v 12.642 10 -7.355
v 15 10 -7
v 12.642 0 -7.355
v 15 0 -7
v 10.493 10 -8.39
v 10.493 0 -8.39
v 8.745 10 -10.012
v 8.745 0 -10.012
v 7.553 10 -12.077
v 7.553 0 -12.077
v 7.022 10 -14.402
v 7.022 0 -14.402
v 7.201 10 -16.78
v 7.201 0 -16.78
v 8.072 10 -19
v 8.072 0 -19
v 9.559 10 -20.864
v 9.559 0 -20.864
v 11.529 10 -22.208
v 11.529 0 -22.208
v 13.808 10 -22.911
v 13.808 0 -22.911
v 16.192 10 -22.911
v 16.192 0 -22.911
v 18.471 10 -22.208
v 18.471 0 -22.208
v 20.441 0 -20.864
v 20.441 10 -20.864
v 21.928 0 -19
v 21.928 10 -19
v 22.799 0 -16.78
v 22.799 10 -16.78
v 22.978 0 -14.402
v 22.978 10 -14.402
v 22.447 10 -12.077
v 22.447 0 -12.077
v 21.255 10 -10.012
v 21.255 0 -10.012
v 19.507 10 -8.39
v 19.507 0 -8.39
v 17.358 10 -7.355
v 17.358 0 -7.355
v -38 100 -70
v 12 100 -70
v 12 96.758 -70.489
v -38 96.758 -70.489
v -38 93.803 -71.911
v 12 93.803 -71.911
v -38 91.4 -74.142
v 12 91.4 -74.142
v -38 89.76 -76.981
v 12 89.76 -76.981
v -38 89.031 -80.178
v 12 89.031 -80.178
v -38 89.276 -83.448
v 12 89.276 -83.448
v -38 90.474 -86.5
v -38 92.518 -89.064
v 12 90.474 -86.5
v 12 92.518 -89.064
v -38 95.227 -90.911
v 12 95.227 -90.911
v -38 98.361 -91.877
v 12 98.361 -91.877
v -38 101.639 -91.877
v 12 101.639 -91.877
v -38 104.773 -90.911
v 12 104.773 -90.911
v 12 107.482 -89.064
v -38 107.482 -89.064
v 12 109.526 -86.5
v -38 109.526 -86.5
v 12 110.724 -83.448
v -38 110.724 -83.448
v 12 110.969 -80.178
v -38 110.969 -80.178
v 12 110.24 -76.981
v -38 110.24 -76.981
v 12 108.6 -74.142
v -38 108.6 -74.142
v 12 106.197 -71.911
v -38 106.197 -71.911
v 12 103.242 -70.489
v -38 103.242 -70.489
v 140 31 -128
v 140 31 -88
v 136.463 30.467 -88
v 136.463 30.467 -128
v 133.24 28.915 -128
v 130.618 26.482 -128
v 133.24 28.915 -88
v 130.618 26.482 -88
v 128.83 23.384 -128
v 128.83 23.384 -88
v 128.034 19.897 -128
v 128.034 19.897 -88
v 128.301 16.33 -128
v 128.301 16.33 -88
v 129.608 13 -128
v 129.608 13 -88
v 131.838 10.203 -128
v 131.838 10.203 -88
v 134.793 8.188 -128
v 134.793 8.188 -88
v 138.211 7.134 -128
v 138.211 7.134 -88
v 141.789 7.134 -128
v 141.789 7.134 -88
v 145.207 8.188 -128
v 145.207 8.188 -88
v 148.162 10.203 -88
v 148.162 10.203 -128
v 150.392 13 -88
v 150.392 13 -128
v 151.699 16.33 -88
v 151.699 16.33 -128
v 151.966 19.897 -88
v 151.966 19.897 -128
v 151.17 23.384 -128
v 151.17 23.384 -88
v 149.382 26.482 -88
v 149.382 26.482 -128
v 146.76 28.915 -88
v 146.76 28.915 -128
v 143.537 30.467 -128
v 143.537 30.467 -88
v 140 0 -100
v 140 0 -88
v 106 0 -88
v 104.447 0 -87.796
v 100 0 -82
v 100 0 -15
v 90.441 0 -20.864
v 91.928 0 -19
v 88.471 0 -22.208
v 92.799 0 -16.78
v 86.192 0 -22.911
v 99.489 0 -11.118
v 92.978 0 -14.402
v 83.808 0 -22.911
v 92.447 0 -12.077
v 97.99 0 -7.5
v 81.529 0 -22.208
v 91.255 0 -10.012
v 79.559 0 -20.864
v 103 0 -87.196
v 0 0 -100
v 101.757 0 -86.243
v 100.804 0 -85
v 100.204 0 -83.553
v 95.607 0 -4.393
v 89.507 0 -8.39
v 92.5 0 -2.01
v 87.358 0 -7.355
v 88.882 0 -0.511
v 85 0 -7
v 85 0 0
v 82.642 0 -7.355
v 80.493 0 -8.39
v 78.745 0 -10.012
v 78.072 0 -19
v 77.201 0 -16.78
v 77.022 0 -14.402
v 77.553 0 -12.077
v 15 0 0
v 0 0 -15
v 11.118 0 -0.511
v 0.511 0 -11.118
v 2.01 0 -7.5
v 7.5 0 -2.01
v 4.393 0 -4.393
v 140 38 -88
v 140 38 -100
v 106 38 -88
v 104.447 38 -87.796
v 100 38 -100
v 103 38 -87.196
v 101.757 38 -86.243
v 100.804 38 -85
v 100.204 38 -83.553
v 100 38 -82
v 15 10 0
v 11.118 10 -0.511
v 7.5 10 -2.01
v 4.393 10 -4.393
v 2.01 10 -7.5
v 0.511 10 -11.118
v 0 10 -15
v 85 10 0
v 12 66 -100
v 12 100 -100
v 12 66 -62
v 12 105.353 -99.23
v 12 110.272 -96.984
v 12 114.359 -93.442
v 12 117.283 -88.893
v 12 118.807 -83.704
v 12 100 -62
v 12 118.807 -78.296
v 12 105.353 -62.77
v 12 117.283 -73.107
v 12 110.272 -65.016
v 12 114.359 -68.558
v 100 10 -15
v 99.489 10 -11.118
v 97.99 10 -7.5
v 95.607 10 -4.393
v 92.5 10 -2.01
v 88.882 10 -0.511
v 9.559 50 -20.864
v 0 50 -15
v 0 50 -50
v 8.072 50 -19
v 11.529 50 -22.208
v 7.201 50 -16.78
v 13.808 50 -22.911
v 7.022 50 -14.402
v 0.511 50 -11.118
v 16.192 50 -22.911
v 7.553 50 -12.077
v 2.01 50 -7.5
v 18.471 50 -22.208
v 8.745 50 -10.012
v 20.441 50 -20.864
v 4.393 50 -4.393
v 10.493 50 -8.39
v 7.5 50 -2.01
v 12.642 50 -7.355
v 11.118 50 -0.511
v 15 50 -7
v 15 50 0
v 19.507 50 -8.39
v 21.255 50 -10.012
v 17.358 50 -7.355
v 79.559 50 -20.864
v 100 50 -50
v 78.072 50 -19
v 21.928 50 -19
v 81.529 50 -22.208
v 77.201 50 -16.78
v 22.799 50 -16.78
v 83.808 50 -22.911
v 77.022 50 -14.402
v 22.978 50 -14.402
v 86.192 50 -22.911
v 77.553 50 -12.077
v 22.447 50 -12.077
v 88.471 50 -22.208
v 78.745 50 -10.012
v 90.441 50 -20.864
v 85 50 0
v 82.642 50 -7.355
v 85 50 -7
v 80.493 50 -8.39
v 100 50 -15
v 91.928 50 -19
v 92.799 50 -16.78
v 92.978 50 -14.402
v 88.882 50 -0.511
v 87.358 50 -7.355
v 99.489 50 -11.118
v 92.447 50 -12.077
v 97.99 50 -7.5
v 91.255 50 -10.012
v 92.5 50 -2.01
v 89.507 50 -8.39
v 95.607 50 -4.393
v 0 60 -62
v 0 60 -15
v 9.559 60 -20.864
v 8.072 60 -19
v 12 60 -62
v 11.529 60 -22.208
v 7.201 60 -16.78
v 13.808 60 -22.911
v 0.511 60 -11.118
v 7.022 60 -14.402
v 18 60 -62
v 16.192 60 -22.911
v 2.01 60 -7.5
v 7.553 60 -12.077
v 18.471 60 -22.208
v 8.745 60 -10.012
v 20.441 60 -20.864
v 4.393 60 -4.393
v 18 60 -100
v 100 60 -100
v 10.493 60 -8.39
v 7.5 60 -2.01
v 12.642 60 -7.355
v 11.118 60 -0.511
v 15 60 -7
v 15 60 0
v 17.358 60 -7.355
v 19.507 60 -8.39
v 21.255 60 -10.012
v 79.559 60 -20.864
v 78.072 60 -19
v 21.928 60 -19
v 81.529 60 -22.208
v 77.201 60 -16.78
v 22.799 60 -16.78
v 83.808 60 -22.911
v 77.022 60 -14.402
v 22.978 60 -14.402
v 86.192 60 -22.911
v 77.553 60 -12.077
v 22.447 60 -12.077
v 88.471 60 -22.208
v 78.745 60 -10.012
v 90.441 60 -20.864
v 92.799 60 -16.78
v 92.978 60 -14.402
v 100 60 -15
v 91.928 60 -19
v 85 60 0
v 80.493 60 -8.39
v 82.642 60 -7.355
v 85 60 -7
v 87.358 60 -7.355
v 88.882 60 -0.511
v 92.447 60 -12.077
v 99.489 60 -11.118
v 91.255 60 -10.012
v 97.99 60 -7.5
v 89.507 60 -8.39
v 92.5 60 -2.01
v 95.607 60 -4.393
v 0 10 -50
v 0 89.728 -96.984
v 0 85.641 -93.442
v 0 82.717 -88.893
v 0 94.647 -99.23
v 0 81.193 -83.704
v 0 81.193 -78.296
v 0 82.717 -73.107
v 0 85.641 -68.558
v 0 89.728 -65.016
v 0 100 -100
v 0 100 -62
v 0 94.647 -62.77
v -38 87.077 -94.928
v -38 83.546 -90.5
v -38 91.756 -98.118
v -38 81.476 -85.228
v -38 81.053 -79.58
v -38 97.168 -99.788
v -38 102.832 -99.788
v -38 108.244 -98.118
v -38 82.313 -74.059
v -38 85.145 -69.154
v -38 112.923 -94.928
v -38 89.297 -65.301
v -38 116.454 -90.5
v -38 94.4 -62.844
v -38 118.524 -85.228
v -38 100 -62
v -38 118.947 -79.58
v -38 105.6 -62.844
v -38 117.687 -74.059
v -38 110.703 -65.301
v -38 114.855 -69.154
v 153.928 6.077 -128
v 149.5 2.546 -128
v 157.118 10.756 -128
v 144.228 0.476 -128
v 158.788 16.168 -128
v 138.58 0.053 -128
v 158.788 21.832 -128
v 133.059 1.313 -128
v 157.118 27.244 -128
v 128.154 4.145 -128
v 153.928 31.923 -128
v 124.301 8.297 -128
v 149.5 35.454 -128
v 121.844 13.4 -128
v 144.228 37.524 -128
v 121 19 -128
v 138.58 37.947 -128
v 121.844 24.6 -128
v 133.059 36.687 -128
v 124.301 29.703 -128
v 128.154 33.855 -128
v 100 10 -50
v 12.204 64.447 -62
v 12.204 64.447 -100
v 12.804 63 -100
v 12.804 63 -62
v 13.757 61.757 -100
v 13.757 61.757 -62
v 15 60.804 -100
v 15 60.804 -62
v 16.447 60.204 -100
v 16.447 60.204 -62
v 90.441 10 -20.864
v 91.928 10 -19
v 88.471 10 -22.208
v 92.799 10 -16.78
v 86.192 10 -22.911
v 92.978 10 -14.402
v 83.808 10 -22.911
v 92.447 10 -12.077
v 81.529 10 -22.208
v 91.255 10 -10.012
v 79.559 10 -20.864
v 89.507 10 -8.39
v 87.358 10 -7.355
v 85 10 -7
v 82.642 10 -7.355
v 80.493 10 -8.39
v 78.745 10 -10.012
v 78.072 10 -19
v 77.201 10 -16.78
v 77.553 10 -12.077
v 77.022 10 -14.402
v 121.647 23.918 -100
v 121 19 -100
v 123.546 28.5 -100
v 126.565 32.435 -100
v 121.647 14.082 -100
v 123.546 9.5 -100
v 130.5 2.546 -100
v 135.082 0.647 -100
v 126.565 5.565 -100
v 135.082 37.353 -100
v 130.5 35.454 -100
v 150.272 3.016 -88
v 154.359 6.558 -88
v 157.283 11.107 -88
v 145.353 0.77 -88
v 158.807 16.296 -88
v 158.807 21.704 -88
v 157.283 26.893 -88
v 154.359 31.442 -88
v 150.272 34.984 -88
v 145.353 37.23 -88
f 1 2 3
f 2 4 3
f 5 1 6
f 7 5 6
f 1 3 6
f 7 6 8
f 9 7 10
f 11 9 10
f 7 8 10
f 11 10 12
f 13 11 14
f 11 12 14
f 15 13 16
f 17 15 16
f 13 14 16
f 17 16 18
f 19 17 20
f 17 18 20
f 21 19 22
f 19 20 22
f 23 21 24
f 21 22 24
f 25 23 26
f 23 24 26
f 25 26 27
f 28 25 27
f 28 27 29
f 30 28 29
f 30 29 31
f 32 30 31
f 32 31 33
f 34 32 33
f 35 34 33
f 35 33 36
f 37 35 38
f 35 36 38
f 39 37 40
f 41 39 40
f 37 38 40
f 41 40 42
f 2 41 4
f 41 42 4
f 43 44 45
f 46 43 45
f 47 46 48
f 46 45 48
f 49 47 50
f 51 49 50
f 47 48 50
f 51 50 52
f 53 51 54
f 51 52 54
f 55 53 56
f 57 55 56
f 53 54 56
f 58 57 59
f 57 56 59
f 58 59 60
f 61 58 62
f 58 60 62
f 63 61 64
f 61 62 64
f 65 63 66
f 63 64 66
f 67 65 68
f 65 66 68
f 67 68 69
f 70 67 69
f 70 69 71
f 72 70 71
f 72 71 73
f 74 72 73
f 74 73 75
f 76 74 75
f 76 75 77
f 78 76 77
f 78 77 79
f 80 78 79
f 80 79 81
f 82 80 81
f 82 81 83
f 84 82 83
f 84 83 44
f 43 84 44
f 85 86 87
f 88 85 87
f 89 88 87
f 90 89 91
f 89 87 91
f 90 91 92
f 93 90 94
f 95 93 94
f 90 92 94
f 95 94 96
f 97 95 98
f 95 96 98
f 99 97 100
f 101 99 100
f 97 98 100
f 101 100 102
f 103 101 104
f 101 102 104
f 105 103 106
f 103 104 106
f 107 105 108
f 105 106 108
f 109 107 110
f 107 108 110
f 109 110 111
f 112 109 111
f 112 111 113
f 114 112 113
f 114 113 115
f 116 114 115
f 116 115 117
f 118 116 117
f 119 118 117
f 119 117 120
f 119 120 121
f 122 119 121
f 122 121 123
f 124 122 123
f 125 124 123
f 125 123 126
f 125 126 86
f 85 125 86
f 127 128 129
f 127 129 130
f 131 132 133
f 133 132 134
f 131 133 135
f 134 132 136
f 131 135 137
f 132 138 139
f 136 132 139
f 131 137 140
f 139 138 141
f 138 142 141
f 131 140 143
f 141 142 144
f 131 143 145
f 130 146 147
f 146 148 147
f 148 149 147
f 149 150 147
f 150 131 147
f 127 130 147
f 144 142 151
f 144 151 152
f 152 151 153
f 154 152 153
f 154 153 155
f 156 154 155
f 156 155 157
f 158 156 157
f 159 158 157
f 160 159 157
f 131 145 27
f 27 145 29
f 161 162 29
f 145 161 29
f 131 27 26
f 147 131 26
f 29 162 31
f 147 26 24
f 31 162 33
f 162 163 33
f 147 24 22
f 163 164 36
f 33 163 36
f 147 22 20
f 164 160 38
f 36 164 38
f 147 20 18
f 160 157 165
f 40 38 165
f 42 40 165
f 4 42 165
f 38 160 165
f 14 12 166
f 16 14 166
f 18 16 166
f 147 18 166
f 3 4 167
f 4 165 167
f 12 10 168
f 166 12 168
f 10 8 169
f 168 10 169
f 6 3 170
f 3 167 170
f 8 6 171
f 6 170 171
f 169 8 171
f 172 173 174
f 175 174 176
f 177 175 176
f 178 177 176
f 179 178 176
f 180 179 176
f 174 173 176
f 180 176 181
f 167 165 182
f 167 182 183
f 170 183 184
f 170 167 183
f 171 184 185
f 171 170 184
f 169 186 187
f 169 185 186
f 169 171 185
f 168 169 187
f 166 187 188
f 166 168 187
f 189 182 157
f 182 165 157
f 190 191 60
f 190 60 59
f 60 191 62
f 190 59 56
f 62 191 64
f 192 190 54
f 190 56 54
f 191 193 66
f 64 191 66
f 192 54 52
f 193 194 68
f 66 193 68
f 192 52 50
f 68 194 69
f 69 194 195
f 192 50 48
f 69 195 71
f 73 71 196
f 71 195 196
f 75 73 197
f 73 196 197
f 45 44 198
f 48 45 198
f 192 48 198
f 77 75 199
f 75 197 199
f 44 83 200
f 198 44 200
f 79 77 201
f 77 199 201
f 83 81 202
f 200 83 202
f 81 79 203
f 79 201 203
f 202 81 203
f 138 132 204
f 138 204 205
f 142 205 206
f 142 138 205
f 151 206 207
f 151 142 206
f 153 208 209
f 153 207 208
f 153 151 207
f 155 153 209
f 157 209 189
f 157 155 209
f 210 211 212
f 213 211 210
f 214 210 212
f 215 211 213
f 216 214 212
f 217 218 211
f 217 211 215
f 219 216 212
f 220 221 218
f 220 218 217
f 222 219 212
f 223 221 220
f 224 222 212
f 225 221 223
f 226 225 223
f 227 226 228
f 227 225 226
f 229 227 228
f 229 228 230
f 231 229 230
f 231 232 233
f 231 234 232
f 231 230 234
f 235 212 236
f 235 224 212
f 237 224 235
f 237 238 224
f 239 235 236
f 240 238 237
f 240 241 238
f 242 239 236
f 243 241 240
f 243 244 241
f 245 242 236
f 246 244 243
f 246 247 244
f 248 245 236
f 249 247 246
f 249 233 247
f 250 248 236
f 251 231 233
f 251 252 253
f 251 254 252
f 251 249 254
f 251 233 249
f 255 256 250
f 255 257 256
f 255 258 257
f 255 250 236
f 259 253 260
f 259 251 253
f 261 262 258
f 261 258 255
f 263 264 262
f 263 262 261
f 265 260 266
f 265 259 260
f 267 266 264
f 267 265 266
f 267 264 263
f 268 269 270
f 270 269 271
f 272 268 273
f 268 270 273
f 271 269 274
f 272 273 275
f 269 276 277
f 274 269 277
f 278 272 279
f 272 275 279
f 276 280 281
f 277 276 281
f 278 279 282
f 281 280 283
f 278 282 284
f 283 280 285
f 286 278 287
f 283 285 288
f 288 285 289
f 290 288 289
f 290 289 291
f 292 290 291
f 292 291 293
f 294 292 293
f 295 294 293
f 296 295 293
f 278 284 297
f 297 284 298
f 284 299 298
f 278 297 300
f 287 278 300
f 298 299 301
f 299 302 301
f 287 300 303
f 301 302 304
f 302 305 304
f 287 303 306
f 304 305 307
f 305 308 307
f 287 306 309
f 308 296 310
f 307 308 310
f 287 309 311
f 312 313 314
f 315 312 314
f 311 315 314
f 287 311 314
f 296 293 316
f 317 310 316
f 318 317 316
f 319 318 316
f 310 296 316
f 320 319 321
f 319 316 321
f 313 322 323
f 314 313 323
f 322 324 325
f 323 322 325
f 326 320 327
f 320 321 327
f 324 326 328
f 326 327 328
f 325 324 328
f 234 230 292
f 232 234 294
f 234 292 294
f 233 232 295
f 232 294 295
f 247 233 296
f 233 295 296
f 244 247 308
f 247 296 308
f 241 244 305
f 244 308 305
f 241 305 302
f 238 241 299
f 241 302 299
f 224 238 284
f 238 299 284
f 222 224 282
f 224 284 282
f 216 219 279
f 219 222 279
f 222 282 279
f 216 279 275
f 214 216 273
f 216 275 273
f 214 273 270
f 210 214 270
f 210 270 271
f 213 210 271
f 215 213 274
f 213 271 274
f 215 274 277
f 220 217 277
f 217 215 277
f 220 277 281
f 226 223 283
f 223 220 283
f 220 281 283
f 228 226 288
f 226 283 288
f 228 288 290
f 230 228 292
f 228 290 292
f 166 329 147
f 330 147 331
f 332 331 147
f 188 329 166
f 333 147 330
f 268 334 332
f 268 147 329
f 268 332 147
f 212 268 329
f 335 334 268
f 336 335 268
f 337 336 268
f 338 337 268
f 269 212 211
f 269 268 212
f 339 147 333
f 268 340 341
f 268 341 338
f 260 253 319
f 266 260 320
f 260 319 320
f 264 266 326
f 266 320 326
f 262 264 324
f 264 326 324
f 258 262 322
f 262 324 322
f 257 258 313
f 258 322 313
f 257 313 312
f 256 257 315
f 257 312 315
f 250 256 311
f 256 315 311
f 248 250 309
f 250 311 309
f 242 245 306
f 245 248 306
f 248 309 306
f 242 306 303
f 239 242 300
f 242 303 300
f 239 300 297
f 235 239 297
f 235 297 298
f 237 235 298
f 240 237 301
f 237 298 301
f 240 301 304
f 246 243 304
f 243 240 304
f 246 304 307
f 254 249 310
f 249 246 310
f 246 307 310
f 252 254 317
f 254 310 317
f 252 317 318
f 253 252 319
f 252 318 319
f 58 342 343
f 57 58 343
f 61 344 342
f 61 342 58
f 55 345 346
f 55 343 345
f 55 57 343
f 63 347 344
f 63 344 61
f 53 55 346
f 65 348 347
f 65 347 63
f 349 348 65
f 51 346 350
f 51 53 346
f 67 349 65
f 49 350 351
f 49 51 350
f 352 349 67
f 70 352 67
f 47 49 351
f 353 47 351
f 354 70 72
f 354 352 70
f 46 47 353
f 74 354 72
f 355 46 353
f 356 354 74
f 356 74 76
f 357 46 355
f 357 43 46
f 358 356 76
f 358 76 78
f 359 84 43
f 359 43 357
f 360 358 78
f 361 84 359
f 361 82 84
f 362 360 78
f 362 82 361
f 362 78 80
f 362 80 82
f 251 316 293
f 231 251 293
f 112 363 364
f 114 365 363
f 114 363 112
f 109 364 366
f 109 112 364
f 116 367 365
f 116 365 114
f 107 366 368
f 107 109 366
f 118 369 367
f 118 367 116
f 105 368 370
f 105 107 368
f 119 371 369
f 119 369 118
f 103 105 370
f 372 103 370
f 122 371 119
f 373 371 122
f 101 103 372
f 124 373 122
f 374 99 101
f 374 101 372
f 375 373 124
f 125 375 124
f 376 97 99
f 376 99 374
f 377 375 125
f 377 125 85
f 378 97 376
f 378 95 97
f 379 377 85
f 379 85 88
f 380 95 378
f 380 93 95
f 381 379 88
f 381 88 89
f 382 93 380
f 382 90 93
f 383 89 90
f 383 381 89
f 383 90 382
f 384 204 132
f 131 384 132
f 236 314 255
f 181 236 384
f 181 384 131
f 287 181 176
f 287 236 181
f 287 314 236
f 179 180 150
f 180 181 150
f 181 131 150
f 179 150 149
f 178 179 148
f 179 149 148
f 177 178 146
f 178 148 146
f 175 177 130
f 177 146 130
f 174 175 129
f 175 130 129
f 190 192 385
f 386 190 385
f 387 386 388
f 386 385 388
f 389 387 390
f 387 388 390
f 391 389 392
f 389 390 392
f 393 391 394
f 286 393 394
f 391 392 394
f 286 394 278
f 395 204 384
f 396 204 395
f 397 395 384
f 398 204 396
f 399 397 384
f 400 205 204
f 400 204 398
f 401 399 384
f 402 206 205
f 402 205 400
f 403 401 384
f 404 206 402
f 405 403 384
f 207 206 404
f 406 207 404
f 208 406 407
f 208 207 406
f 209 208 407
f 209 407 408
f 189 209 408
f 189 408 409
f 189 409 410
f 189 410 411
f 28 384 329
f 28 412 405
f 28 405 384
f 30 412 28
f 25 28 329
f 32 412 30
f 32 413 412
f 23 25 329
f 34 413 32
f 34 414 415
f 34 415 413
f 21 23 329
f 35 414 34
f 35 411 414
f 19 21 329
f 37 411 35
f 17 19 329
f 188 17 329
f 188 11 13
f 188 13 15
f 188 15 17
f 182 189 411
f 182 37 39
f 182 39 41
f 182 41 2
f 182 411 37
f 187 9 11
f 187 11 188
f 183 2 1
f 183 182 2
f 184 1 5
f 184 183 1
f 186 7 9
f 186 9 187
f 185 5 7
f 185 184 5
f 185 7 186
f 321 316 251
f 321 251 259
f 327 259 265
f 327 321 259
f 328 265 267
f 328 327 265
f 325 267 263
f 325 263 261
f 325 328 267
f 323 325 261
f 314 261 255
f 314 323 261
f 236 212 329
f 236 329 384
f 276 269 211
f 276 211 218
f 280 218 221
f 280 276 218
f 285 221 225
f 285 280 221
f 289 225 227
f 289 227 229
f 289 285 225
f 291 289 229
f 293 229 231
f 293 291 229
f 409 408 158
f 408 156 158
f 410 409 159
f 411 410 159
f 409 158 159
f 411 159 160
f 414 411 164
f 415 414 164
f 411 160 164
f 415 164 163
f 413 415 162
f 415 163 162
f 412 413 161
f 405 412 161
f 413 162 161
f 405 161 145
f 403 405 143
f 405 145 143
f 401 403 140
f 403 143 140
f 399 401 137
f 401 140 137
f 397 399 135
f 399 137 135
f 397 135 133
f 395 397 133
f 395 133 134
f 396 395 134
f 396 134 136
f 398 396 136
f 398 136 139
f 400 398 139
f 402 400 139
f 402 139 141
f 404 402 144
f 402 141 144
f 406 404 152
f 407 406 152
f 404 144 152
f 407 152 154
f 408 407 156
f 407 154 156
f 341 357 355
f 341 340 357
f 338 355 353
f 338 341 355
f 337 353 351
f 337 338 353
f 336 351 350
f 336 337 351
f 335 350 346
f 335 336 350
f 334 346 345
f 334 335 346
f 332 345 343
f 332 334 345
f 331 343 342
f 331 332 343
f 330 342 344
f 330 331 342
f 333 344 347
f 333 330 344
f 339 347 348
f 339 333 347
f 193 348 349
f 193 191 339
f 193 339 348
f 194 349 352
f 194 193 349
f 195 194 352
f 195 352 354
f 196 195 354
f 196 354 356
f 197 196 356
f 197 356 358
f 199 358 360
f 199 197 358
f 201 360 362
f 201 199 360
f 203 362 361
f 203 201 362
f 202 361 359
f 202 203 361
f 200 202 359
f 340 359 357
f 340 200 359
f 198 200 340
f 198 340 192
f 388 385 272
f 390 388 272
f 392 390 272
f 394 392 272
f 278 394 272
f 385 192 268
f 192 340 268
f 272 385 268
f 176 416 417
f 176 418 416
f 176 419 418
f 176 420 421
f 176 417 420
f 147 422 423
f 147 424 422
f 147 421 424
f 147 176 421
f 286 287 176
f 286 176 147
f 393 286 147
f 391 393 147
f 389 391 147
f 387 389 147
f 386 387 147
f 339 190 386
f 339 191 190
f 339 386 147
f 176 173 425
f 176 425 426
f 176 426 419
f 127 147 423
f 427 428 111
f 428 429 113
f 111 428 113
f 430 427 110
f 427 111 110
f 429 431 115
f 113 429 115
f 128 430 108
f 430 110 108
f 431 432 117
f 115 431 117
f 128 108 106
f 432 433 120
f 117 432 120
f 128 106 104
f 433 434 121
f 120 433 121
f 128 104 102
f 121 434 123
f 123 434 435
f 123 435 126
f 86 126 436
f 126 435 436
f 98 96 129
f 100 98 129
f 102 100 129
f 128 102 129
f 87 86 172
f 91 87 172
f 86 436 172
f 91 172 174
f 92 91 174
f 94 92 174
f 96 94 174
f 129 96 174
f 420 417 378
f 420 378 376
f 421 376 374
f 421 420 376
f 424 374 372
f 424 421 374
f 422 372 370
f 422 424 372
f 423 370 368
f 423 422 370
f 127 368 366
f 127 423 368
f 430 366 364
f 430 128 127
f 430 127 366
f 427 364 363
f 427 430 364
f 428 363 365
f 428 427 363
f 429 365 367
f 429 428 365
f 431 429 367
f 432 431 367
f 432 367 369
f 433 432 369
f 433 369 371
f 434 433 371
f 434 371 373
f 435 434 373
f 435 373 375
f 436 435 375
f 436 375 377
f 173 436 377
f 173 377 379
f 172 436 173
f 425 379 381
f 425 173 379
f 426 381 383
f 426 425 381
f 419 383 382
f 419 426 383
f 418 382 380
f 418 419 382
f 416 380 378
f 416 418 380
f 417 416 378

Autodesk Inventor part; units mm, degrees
ref_plane "YZ Plane" through (0, 0, 0) normal (1, 0, 0) x (0, 1, 0)
ref_plane "XZ Plane" through (0, 0, 0) normal (0, 1, 0) x (-1, 0, 0)
ref_plane "XY Plane" through (0, 0, 0) normal (0, 0, 1) x (1, 0, 0)
sketch "Szkic1" plane through (0, 0, 0) normal (0, 1, 0) x (-1, 0, 0)
  line L0 (-15, 0) -> (-85, 0)
  line L1 (-100, -15) -> (-100, -100)
  line L2 (-100, -100) -> (0, -100)
  line L3 (0, -100) -> (0, -15)
  arc A0 (0, -15) -> (-15, 0) centre (-15, -15) ccw
  arc A1 (-85, 0) -> (-100, -15) centre (-85, -15) ccw
  point P0 (0, 0)
  point P1 (-100, 0)
  dimension "d0" = 100
  dimension "d1" = 100
  dimension "d2" = 15
extrude "Wyciągnięcie proste1" add sketch "Szkic1" along normal blind 10
sketch "Szkic2" plane through (0, 10, 0) normal (0, 1, 0) x (1, 0, 0)
  line L0 (0, 100) -> (100, 100)
  line L1 (100, 100) -> (100, 50)
  line L2 (100, 50) -> (0, 50)
  line L3 (0, 50) -> (0, 100)
  point P0 (0, 0)
  dimension "d5" = 100
  dimension "d6" = 50
extrude "Wyciągnięcie proste2" add sketch "Szkic2" along normal blind 20
sketch "Szkic3" plane through (0, 10, 0) normal (0, 1, 0) x (1, 0, 0)
  arc A0 (0, 15) -> (15, 0) centre (15, 15) ccw projected
  arc A1 (85, 0) -> (100, 15) centre (85, 15) ccw projected
  point P0 (0, 0)
hole "Otwór1" at (15, 10, -15) at (85, 10, -15) direction (0, -1, 0) diameter 16 end through all
mirror "Odbij1" about plane through (50, 30, -75) normal (0, 1, 0) of "Wyciągnięcie proste1", "Otwór1", "Wyciągnięcie proste2"
sketch "Szkic4" plane through (100, 0, -100) normal (0, 0, -1) x (-1, 0, 0)
  circle A0 centre (-40, 19) radius 19
  line L0 (15, 0) -> (0, 0) projected
  line L1 (0, 0) -> (-40, 0)
  line L2 (-40, 38) -> (0, 38)
  line L3 (0, 10) -> (0, 50) projected
  line L4 (0, 0) -> (0, 38)
  point P0 (100, 0)
  dimension "d16" = 38
  dimension "d17" = 40
extrude "Wyciągnięcie proste3" add sketch "Szkic4" against normal blind 12
sketch "Szkic5" plane through (100, 60, -100) normal (0, 0, -1) x (-1, 0, 0)
  arc A0 (-40, -22) -> (-40, -60) centre (-40, -41) ccw projected
  circle A1 centre (-40, -41) radius 19
  point P0 (100, -60)
  point P1 (-40, -22)
  dimension "d20" = 38
extrude "Wyciągnięcie proste4" add sketch "Szkic5" along normal blind 28
sketch "Szkic6" plane through (140, 19, -128) normal (0, 0, -1) x (-1, 0, 0)
  point P0 (140, -19)
  point P1 (0, 0)
hole "Otwór2" at (140, 19, -128) direction (0, 0, 1) diameter 24 end through all
fillet "Zaokrąglenie1" radius 6 1 edges at (100, 19, -88)
sketch "Szkic7" plane through (0, 0, -100) normal (-1, 0, 0) x (0, 0, 1)
  circle A0 centre (19, 100) radius 19
  line L0 (0, 0) -> (0, 60) projected
  line L1 (0, 60) -> (0, 100)
  line L2 (38, 100) -> (38, 60)
  line L3 (0, 60) -> (85, 60) projected
  point P0 (100, 0)
  dimension "d31" = 38
  dimension "d32" = 40
extrude "Wyciągnięcie proste5" add sketch "Szkic7" against normal blind 12
sketch "Szkic8" plane through (0, 0, -100) normal (-1, 0, 0) x (0, 0, 1)
  arc A0 (38, 100) -> (0, 100) centre (19, 100) ccw projected
  circle A1 centre (19, 100) radius 19
  point P0 (100, 0)
  dimension "d35" = 38
extrude "Wyciągnięcie proste6" add sketch "Szkic8" along normal blind 38
sketch "Szkic9" plane through (-38, 100, -81) normal (-1, 0, 0) x (0, 0, 1)
  point P0 (81, -100)
  point P1 (0, 0)
hole "Otwór3" at (-38, 100, -81) direction (1, 0, 0) diameter 22 end through all
fillet "Zaokrąglenie2" radius 6 1 edges at (12, 60, -81)
